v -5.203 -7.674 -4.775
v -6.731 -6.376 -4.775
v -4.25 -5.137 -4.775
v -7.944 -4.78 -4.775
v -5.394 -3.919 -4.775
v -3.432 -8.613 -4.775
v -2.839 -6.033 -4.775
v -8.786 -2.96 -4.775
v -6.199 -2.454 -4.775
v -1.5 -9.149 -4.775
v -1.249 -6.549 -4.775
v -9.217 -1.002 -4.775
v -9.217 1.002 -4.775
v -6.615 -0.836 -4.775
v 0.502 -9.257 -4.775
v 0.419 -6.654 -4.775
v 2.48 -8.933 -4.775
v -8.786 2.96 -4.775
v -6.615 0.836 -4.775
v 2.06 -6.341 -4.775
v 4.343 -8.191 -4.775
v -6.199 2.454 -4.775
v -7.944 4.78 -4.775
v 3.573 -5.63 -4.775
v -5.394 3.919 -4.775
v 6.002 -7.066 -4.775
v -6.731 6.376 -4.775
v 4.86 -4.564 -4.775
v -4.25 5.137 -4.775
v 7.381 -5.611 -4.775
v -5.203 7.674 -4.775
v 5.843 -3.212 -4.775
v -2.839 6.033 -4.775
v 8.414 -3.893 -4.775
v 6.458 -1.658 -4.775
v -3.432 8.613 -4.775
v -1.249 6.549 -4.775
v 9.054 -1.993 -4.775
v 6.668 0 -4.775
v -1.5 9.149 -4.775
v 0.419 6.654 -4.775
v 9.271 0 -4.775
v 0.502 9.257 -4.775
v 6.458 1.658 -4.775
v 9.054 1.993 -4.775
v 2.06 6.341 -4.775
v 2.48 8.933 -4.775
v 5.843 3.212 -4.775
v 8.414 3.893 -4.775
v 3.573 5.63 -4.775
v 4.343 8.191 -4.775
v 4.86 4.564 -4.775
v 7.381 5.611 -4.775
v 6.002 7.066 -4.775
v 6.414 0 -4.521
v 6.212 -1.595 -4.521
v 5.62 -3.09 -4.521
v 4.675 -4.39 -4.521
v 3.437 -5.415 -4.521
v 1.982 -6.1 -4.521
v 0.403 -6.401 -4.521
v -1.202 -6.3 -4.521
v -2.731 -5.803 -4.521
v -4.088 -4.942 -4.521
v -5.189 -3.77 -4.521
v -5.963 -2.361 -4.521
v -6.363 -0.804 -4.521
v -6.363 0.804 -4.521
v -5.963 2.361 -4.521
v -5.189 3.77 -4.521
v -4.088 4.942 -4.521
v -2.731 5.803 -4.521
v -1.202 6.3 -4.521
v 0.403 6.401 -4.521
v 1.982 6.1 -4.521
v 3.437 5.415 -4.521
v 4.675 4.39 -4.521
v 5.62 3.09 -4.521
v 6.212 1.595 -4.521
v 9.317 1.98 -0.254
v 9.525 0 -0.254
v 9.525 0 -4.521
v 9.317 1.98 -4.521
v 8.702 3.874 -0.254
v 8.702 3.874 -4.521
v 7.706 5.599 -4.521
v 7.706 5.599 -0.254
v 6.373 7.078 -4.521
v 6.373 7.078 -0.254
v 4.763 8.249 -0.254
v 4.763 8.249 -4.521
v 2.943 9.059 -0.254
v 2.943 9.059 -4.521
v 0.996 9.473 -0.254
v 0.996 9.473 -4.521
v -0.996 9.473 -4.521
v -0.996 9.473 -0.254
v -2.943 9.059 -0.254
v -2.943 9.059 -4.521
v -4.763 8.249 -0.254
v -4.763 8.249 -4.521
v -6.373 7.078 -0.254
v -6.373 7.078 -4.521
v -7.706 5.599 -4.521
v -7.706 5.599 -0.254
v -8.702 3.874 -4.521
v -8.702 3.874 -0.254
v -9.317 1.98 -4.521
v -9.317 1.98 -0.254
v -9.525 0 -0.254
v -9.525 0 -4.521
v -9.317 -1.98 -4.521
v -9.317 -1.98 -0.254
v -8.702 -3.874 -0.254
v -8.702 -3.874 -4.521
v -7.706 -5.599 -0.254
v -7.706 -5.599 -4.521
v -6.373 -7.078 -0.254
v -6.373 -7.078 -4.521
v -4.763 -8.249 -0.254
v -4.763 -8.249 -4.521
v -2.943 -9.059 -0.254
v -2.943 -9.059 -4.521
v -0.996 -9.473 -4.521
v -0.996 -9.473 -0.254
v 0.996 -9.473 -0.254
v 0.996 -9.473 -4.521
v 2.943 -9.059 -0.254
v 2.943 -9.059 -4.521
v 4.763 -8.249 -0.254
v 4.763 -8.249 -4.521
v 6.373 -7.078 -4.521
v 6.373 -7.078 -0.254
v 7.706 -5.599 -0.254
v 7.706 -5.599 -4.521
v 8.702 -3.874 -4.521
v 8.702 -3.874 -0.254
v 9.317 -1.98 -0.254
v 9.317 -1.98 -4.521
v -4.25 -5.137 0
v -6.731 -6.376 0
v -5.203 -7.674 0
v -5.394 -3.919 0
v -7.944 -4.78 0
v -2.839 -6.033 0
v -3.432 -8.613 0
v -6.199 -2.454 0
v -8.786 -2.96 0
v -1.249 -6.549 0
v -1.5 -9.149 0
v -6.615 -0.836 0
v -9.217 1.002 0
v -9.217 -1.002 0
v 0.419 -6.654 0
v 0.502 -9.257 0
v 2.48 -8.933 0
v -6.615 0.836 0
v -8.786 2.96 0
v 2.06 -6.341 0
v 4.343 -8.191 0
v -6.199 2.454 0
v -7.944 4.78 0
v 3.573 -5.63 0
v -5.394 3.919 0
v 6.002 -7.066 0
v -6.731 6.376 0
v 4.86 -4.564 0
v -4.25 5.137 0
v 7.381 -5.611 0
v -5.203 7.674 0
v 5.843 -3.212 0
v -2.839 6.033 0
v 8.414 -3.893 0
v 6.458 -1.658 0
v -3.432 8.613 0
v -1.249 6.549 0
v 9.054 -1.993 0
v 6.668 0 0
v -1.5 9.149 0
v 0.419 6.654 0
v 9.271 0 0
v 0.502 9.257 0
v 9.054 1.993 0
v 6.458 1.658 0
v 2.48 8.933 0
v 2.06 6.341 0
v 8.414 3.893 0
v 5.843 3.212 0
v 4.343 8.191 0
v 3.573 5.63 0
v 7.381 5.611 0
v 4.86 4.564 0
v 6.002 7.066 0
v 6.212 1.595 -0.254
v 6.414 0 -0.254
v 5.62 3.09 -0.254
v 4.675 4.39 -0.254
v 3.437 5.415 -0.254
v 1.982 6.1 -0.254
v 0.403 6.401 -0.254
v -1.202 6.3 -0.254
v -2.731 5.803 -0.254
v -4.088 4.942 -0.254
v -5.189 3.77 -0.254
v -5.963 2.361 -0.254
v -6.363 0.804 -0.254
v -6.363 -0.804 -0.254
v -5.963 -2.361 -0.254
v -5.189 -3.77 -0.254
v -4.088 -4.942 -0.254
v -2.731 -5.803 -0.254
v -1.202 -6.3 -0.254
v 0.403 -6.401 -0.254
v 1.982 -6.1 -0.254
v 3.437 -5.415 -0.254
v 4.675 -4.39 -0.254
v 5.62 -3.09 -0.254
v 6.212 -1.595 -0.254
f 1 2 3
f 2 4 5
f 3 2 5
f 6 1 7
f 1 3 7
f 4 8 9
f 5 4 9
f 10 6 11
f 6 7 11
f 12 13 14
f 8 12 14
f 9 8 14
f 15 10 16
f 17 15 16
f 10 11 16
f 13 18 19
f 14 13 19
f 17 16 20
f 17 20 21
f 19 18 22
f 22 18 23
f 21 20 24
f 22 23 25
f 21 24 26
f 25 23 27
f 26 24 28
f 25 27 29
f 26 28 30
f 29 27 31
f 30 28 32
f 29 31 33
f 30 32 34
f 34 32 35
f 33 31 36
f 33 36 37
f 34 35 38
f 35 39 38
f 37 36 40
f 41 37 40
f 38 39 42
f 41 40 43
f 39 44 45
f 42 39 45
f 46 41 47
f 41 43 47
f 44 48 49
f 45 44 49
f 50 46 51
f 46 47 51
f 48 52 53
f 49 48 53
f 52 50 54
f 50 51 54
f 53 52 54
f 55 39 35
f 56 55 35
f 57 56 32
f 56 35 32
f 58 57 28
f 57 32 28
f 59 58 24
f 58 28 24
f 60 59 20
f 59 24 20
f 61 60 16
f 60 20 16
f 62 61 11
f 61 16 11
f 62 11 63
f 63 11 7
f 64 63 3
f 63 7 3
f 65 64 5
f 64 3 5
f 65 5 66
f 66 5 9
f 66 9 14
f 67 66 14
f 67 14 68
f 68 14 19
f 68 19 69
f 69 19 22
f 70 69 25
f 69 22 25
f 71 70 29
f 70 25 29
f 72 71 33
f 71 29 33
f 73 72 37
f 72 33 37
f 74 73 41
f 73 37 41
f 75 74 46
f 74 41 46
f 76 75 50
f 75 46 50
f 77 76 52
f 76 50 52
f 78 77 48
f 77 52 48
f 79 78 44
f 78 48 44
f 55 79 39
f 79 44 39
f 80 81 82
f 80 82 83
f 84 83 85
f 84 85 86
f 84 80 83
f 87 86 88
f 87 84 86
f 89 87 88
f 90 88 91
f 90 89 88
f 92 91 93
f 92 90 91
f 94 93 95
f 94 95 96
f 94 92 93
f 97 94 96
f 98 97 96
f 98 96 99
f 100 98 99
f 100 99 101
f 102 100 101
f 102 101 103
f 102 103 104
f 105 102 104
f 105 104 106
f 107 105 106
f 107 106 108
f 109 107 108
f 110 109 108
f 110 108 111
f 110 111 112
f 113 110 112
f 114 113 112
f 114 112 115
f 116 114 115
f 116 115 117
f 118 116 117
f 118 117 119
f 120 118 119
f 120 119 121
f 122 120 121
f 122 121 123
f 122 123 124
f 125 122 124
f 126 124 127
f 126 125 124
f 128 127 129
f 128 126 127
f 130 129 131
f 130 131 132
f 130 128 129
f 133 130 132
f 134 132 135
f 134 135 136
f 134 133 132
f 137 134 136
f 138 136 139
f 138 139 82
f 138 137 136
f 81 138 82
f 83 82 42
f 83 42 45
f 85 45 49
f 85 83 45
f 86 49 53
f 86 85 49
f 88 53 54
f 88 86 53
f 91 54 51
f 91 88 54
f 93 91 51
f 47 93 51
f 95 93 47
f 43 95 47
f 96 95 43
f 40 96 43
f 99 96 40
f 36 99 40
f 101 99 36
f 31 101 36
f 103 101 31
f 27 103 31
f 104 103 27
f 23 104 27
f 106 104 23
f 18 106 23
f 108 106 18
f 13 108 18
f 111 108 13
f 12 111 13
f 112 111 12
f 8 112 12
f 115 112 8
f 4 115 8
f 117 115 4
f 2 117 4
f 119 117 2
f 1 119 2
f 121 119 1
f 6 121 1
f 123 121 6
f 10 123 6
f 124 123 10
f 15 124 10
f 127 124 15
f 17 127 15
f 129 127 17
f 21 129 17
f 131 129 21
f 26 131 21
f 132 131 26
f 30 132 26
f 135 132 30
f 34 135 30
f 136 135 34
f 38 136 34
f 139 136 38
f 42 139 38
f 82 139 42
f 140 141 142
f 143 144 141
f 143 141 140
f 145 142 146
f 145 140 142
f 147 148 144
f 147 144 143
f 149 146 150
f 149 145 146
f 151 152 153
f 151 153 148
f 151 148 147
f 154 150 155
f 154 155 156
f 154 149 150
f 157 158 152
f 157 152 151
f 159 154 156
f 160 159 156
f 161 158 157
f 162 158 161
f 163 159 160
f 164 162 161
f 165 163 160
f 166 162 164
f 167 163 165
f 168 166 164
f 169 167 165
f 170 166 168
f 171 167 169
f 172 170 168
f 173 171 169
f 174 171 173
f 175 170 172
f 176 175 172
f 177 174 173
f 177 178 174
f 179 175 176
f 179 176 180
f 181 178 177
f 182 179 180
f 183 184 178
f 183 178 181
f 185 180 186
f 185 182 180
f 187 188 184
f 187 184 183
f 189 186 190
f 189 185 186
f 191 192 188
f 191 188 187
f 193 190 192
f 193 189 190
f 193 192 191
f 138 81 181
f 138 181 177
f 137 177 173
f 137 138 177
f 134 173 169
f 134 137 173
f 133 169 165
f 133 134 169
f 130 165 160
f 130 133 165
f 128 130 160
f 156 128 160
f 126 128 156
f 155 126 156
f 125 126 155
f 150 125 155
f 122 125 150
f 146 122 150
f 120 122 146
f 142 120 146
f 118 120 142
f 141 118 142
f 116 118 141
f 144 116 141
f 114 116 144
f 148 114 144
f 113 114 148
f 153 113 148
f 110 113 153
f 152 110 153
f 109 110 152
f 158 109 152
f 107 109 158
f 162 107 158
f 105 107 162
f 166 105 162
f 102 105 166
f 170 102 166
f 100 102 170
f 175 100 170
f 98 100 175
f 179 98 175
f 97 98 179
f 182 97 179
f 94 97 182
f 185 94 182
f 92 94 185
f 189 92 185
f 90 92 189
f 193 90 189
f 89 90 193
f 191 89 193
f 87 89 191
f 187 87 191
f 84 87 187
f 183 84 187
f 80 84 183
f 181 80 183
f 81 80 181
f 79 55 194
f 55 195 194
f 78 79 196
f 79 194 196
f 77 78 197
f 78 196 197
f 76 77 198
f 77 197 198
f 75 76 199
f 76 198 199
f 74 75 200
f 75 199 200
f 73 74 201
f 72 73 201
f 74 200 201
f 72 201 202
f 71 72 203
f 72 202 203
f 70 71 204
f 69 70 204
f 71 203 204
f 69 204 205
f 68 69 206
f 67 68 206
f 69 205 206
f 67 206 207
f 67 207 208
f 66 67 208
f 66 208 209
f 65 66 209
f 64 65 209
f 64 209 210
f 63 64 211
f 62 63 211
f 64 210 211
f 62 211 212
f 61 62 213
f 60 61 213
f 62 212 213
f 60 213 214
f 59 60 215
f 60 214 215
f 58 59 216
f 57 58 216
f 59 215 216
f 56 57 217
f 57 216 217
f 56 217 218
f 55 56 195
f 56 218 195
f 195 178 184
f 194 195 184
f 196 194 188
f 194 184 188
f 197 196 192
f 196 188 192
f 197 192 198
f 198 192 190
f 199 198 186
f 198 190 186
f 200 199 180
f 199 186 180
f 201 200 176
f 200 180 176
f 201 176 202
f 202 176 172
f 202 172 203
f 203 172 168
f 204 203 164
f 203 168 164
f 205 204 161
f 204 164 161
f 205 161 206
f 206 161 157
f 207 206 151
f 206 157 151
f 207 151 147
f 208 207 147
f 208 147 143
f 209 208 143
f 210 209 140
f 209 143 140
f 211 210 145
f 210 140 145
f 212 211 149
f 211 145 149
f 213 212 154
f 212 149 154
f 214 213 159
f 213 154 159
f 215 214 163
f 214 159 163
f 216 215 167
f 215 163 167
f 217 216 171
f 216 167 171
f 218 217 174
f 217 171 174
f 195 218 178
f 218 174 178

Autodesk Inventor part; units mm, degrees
ref_plane "YZ Plane" through (0, 0, 0) normal (1, 0, 0) x (0, 1, 0)
ref_plane "XZ Plane" through (0, 0, 0) normal (0, 1, 0) x (-1, 0, 0)
ref_plane "XY Plane" through (0, 0, 0) normal (0, 0, 1) x (1, 0, 0)
sketch "Sketch1" plane through (0, 0, 0) normal (0, 0, 1) x (1, 0, 0)
  circle A0 centre (0, 0) radius 6.4135
  circle A1 centre (0, 0) radius 9.525
  dimension "d0" = 12.827
  dimension "d1" = 19.05
extrude "Extrusion1" add sketch "Sketch1" against normal blind 4.7752
chamfer "Chamfer1" distance 0.254 angle 45 4 edges at (-9.525, 0, 0) (-6.4135, 0, 0) (-9.525, 0, -4.7752) (-6.4135, 0, -4.7752)
properties part number "am-2271" material "Nylon-6/6"
